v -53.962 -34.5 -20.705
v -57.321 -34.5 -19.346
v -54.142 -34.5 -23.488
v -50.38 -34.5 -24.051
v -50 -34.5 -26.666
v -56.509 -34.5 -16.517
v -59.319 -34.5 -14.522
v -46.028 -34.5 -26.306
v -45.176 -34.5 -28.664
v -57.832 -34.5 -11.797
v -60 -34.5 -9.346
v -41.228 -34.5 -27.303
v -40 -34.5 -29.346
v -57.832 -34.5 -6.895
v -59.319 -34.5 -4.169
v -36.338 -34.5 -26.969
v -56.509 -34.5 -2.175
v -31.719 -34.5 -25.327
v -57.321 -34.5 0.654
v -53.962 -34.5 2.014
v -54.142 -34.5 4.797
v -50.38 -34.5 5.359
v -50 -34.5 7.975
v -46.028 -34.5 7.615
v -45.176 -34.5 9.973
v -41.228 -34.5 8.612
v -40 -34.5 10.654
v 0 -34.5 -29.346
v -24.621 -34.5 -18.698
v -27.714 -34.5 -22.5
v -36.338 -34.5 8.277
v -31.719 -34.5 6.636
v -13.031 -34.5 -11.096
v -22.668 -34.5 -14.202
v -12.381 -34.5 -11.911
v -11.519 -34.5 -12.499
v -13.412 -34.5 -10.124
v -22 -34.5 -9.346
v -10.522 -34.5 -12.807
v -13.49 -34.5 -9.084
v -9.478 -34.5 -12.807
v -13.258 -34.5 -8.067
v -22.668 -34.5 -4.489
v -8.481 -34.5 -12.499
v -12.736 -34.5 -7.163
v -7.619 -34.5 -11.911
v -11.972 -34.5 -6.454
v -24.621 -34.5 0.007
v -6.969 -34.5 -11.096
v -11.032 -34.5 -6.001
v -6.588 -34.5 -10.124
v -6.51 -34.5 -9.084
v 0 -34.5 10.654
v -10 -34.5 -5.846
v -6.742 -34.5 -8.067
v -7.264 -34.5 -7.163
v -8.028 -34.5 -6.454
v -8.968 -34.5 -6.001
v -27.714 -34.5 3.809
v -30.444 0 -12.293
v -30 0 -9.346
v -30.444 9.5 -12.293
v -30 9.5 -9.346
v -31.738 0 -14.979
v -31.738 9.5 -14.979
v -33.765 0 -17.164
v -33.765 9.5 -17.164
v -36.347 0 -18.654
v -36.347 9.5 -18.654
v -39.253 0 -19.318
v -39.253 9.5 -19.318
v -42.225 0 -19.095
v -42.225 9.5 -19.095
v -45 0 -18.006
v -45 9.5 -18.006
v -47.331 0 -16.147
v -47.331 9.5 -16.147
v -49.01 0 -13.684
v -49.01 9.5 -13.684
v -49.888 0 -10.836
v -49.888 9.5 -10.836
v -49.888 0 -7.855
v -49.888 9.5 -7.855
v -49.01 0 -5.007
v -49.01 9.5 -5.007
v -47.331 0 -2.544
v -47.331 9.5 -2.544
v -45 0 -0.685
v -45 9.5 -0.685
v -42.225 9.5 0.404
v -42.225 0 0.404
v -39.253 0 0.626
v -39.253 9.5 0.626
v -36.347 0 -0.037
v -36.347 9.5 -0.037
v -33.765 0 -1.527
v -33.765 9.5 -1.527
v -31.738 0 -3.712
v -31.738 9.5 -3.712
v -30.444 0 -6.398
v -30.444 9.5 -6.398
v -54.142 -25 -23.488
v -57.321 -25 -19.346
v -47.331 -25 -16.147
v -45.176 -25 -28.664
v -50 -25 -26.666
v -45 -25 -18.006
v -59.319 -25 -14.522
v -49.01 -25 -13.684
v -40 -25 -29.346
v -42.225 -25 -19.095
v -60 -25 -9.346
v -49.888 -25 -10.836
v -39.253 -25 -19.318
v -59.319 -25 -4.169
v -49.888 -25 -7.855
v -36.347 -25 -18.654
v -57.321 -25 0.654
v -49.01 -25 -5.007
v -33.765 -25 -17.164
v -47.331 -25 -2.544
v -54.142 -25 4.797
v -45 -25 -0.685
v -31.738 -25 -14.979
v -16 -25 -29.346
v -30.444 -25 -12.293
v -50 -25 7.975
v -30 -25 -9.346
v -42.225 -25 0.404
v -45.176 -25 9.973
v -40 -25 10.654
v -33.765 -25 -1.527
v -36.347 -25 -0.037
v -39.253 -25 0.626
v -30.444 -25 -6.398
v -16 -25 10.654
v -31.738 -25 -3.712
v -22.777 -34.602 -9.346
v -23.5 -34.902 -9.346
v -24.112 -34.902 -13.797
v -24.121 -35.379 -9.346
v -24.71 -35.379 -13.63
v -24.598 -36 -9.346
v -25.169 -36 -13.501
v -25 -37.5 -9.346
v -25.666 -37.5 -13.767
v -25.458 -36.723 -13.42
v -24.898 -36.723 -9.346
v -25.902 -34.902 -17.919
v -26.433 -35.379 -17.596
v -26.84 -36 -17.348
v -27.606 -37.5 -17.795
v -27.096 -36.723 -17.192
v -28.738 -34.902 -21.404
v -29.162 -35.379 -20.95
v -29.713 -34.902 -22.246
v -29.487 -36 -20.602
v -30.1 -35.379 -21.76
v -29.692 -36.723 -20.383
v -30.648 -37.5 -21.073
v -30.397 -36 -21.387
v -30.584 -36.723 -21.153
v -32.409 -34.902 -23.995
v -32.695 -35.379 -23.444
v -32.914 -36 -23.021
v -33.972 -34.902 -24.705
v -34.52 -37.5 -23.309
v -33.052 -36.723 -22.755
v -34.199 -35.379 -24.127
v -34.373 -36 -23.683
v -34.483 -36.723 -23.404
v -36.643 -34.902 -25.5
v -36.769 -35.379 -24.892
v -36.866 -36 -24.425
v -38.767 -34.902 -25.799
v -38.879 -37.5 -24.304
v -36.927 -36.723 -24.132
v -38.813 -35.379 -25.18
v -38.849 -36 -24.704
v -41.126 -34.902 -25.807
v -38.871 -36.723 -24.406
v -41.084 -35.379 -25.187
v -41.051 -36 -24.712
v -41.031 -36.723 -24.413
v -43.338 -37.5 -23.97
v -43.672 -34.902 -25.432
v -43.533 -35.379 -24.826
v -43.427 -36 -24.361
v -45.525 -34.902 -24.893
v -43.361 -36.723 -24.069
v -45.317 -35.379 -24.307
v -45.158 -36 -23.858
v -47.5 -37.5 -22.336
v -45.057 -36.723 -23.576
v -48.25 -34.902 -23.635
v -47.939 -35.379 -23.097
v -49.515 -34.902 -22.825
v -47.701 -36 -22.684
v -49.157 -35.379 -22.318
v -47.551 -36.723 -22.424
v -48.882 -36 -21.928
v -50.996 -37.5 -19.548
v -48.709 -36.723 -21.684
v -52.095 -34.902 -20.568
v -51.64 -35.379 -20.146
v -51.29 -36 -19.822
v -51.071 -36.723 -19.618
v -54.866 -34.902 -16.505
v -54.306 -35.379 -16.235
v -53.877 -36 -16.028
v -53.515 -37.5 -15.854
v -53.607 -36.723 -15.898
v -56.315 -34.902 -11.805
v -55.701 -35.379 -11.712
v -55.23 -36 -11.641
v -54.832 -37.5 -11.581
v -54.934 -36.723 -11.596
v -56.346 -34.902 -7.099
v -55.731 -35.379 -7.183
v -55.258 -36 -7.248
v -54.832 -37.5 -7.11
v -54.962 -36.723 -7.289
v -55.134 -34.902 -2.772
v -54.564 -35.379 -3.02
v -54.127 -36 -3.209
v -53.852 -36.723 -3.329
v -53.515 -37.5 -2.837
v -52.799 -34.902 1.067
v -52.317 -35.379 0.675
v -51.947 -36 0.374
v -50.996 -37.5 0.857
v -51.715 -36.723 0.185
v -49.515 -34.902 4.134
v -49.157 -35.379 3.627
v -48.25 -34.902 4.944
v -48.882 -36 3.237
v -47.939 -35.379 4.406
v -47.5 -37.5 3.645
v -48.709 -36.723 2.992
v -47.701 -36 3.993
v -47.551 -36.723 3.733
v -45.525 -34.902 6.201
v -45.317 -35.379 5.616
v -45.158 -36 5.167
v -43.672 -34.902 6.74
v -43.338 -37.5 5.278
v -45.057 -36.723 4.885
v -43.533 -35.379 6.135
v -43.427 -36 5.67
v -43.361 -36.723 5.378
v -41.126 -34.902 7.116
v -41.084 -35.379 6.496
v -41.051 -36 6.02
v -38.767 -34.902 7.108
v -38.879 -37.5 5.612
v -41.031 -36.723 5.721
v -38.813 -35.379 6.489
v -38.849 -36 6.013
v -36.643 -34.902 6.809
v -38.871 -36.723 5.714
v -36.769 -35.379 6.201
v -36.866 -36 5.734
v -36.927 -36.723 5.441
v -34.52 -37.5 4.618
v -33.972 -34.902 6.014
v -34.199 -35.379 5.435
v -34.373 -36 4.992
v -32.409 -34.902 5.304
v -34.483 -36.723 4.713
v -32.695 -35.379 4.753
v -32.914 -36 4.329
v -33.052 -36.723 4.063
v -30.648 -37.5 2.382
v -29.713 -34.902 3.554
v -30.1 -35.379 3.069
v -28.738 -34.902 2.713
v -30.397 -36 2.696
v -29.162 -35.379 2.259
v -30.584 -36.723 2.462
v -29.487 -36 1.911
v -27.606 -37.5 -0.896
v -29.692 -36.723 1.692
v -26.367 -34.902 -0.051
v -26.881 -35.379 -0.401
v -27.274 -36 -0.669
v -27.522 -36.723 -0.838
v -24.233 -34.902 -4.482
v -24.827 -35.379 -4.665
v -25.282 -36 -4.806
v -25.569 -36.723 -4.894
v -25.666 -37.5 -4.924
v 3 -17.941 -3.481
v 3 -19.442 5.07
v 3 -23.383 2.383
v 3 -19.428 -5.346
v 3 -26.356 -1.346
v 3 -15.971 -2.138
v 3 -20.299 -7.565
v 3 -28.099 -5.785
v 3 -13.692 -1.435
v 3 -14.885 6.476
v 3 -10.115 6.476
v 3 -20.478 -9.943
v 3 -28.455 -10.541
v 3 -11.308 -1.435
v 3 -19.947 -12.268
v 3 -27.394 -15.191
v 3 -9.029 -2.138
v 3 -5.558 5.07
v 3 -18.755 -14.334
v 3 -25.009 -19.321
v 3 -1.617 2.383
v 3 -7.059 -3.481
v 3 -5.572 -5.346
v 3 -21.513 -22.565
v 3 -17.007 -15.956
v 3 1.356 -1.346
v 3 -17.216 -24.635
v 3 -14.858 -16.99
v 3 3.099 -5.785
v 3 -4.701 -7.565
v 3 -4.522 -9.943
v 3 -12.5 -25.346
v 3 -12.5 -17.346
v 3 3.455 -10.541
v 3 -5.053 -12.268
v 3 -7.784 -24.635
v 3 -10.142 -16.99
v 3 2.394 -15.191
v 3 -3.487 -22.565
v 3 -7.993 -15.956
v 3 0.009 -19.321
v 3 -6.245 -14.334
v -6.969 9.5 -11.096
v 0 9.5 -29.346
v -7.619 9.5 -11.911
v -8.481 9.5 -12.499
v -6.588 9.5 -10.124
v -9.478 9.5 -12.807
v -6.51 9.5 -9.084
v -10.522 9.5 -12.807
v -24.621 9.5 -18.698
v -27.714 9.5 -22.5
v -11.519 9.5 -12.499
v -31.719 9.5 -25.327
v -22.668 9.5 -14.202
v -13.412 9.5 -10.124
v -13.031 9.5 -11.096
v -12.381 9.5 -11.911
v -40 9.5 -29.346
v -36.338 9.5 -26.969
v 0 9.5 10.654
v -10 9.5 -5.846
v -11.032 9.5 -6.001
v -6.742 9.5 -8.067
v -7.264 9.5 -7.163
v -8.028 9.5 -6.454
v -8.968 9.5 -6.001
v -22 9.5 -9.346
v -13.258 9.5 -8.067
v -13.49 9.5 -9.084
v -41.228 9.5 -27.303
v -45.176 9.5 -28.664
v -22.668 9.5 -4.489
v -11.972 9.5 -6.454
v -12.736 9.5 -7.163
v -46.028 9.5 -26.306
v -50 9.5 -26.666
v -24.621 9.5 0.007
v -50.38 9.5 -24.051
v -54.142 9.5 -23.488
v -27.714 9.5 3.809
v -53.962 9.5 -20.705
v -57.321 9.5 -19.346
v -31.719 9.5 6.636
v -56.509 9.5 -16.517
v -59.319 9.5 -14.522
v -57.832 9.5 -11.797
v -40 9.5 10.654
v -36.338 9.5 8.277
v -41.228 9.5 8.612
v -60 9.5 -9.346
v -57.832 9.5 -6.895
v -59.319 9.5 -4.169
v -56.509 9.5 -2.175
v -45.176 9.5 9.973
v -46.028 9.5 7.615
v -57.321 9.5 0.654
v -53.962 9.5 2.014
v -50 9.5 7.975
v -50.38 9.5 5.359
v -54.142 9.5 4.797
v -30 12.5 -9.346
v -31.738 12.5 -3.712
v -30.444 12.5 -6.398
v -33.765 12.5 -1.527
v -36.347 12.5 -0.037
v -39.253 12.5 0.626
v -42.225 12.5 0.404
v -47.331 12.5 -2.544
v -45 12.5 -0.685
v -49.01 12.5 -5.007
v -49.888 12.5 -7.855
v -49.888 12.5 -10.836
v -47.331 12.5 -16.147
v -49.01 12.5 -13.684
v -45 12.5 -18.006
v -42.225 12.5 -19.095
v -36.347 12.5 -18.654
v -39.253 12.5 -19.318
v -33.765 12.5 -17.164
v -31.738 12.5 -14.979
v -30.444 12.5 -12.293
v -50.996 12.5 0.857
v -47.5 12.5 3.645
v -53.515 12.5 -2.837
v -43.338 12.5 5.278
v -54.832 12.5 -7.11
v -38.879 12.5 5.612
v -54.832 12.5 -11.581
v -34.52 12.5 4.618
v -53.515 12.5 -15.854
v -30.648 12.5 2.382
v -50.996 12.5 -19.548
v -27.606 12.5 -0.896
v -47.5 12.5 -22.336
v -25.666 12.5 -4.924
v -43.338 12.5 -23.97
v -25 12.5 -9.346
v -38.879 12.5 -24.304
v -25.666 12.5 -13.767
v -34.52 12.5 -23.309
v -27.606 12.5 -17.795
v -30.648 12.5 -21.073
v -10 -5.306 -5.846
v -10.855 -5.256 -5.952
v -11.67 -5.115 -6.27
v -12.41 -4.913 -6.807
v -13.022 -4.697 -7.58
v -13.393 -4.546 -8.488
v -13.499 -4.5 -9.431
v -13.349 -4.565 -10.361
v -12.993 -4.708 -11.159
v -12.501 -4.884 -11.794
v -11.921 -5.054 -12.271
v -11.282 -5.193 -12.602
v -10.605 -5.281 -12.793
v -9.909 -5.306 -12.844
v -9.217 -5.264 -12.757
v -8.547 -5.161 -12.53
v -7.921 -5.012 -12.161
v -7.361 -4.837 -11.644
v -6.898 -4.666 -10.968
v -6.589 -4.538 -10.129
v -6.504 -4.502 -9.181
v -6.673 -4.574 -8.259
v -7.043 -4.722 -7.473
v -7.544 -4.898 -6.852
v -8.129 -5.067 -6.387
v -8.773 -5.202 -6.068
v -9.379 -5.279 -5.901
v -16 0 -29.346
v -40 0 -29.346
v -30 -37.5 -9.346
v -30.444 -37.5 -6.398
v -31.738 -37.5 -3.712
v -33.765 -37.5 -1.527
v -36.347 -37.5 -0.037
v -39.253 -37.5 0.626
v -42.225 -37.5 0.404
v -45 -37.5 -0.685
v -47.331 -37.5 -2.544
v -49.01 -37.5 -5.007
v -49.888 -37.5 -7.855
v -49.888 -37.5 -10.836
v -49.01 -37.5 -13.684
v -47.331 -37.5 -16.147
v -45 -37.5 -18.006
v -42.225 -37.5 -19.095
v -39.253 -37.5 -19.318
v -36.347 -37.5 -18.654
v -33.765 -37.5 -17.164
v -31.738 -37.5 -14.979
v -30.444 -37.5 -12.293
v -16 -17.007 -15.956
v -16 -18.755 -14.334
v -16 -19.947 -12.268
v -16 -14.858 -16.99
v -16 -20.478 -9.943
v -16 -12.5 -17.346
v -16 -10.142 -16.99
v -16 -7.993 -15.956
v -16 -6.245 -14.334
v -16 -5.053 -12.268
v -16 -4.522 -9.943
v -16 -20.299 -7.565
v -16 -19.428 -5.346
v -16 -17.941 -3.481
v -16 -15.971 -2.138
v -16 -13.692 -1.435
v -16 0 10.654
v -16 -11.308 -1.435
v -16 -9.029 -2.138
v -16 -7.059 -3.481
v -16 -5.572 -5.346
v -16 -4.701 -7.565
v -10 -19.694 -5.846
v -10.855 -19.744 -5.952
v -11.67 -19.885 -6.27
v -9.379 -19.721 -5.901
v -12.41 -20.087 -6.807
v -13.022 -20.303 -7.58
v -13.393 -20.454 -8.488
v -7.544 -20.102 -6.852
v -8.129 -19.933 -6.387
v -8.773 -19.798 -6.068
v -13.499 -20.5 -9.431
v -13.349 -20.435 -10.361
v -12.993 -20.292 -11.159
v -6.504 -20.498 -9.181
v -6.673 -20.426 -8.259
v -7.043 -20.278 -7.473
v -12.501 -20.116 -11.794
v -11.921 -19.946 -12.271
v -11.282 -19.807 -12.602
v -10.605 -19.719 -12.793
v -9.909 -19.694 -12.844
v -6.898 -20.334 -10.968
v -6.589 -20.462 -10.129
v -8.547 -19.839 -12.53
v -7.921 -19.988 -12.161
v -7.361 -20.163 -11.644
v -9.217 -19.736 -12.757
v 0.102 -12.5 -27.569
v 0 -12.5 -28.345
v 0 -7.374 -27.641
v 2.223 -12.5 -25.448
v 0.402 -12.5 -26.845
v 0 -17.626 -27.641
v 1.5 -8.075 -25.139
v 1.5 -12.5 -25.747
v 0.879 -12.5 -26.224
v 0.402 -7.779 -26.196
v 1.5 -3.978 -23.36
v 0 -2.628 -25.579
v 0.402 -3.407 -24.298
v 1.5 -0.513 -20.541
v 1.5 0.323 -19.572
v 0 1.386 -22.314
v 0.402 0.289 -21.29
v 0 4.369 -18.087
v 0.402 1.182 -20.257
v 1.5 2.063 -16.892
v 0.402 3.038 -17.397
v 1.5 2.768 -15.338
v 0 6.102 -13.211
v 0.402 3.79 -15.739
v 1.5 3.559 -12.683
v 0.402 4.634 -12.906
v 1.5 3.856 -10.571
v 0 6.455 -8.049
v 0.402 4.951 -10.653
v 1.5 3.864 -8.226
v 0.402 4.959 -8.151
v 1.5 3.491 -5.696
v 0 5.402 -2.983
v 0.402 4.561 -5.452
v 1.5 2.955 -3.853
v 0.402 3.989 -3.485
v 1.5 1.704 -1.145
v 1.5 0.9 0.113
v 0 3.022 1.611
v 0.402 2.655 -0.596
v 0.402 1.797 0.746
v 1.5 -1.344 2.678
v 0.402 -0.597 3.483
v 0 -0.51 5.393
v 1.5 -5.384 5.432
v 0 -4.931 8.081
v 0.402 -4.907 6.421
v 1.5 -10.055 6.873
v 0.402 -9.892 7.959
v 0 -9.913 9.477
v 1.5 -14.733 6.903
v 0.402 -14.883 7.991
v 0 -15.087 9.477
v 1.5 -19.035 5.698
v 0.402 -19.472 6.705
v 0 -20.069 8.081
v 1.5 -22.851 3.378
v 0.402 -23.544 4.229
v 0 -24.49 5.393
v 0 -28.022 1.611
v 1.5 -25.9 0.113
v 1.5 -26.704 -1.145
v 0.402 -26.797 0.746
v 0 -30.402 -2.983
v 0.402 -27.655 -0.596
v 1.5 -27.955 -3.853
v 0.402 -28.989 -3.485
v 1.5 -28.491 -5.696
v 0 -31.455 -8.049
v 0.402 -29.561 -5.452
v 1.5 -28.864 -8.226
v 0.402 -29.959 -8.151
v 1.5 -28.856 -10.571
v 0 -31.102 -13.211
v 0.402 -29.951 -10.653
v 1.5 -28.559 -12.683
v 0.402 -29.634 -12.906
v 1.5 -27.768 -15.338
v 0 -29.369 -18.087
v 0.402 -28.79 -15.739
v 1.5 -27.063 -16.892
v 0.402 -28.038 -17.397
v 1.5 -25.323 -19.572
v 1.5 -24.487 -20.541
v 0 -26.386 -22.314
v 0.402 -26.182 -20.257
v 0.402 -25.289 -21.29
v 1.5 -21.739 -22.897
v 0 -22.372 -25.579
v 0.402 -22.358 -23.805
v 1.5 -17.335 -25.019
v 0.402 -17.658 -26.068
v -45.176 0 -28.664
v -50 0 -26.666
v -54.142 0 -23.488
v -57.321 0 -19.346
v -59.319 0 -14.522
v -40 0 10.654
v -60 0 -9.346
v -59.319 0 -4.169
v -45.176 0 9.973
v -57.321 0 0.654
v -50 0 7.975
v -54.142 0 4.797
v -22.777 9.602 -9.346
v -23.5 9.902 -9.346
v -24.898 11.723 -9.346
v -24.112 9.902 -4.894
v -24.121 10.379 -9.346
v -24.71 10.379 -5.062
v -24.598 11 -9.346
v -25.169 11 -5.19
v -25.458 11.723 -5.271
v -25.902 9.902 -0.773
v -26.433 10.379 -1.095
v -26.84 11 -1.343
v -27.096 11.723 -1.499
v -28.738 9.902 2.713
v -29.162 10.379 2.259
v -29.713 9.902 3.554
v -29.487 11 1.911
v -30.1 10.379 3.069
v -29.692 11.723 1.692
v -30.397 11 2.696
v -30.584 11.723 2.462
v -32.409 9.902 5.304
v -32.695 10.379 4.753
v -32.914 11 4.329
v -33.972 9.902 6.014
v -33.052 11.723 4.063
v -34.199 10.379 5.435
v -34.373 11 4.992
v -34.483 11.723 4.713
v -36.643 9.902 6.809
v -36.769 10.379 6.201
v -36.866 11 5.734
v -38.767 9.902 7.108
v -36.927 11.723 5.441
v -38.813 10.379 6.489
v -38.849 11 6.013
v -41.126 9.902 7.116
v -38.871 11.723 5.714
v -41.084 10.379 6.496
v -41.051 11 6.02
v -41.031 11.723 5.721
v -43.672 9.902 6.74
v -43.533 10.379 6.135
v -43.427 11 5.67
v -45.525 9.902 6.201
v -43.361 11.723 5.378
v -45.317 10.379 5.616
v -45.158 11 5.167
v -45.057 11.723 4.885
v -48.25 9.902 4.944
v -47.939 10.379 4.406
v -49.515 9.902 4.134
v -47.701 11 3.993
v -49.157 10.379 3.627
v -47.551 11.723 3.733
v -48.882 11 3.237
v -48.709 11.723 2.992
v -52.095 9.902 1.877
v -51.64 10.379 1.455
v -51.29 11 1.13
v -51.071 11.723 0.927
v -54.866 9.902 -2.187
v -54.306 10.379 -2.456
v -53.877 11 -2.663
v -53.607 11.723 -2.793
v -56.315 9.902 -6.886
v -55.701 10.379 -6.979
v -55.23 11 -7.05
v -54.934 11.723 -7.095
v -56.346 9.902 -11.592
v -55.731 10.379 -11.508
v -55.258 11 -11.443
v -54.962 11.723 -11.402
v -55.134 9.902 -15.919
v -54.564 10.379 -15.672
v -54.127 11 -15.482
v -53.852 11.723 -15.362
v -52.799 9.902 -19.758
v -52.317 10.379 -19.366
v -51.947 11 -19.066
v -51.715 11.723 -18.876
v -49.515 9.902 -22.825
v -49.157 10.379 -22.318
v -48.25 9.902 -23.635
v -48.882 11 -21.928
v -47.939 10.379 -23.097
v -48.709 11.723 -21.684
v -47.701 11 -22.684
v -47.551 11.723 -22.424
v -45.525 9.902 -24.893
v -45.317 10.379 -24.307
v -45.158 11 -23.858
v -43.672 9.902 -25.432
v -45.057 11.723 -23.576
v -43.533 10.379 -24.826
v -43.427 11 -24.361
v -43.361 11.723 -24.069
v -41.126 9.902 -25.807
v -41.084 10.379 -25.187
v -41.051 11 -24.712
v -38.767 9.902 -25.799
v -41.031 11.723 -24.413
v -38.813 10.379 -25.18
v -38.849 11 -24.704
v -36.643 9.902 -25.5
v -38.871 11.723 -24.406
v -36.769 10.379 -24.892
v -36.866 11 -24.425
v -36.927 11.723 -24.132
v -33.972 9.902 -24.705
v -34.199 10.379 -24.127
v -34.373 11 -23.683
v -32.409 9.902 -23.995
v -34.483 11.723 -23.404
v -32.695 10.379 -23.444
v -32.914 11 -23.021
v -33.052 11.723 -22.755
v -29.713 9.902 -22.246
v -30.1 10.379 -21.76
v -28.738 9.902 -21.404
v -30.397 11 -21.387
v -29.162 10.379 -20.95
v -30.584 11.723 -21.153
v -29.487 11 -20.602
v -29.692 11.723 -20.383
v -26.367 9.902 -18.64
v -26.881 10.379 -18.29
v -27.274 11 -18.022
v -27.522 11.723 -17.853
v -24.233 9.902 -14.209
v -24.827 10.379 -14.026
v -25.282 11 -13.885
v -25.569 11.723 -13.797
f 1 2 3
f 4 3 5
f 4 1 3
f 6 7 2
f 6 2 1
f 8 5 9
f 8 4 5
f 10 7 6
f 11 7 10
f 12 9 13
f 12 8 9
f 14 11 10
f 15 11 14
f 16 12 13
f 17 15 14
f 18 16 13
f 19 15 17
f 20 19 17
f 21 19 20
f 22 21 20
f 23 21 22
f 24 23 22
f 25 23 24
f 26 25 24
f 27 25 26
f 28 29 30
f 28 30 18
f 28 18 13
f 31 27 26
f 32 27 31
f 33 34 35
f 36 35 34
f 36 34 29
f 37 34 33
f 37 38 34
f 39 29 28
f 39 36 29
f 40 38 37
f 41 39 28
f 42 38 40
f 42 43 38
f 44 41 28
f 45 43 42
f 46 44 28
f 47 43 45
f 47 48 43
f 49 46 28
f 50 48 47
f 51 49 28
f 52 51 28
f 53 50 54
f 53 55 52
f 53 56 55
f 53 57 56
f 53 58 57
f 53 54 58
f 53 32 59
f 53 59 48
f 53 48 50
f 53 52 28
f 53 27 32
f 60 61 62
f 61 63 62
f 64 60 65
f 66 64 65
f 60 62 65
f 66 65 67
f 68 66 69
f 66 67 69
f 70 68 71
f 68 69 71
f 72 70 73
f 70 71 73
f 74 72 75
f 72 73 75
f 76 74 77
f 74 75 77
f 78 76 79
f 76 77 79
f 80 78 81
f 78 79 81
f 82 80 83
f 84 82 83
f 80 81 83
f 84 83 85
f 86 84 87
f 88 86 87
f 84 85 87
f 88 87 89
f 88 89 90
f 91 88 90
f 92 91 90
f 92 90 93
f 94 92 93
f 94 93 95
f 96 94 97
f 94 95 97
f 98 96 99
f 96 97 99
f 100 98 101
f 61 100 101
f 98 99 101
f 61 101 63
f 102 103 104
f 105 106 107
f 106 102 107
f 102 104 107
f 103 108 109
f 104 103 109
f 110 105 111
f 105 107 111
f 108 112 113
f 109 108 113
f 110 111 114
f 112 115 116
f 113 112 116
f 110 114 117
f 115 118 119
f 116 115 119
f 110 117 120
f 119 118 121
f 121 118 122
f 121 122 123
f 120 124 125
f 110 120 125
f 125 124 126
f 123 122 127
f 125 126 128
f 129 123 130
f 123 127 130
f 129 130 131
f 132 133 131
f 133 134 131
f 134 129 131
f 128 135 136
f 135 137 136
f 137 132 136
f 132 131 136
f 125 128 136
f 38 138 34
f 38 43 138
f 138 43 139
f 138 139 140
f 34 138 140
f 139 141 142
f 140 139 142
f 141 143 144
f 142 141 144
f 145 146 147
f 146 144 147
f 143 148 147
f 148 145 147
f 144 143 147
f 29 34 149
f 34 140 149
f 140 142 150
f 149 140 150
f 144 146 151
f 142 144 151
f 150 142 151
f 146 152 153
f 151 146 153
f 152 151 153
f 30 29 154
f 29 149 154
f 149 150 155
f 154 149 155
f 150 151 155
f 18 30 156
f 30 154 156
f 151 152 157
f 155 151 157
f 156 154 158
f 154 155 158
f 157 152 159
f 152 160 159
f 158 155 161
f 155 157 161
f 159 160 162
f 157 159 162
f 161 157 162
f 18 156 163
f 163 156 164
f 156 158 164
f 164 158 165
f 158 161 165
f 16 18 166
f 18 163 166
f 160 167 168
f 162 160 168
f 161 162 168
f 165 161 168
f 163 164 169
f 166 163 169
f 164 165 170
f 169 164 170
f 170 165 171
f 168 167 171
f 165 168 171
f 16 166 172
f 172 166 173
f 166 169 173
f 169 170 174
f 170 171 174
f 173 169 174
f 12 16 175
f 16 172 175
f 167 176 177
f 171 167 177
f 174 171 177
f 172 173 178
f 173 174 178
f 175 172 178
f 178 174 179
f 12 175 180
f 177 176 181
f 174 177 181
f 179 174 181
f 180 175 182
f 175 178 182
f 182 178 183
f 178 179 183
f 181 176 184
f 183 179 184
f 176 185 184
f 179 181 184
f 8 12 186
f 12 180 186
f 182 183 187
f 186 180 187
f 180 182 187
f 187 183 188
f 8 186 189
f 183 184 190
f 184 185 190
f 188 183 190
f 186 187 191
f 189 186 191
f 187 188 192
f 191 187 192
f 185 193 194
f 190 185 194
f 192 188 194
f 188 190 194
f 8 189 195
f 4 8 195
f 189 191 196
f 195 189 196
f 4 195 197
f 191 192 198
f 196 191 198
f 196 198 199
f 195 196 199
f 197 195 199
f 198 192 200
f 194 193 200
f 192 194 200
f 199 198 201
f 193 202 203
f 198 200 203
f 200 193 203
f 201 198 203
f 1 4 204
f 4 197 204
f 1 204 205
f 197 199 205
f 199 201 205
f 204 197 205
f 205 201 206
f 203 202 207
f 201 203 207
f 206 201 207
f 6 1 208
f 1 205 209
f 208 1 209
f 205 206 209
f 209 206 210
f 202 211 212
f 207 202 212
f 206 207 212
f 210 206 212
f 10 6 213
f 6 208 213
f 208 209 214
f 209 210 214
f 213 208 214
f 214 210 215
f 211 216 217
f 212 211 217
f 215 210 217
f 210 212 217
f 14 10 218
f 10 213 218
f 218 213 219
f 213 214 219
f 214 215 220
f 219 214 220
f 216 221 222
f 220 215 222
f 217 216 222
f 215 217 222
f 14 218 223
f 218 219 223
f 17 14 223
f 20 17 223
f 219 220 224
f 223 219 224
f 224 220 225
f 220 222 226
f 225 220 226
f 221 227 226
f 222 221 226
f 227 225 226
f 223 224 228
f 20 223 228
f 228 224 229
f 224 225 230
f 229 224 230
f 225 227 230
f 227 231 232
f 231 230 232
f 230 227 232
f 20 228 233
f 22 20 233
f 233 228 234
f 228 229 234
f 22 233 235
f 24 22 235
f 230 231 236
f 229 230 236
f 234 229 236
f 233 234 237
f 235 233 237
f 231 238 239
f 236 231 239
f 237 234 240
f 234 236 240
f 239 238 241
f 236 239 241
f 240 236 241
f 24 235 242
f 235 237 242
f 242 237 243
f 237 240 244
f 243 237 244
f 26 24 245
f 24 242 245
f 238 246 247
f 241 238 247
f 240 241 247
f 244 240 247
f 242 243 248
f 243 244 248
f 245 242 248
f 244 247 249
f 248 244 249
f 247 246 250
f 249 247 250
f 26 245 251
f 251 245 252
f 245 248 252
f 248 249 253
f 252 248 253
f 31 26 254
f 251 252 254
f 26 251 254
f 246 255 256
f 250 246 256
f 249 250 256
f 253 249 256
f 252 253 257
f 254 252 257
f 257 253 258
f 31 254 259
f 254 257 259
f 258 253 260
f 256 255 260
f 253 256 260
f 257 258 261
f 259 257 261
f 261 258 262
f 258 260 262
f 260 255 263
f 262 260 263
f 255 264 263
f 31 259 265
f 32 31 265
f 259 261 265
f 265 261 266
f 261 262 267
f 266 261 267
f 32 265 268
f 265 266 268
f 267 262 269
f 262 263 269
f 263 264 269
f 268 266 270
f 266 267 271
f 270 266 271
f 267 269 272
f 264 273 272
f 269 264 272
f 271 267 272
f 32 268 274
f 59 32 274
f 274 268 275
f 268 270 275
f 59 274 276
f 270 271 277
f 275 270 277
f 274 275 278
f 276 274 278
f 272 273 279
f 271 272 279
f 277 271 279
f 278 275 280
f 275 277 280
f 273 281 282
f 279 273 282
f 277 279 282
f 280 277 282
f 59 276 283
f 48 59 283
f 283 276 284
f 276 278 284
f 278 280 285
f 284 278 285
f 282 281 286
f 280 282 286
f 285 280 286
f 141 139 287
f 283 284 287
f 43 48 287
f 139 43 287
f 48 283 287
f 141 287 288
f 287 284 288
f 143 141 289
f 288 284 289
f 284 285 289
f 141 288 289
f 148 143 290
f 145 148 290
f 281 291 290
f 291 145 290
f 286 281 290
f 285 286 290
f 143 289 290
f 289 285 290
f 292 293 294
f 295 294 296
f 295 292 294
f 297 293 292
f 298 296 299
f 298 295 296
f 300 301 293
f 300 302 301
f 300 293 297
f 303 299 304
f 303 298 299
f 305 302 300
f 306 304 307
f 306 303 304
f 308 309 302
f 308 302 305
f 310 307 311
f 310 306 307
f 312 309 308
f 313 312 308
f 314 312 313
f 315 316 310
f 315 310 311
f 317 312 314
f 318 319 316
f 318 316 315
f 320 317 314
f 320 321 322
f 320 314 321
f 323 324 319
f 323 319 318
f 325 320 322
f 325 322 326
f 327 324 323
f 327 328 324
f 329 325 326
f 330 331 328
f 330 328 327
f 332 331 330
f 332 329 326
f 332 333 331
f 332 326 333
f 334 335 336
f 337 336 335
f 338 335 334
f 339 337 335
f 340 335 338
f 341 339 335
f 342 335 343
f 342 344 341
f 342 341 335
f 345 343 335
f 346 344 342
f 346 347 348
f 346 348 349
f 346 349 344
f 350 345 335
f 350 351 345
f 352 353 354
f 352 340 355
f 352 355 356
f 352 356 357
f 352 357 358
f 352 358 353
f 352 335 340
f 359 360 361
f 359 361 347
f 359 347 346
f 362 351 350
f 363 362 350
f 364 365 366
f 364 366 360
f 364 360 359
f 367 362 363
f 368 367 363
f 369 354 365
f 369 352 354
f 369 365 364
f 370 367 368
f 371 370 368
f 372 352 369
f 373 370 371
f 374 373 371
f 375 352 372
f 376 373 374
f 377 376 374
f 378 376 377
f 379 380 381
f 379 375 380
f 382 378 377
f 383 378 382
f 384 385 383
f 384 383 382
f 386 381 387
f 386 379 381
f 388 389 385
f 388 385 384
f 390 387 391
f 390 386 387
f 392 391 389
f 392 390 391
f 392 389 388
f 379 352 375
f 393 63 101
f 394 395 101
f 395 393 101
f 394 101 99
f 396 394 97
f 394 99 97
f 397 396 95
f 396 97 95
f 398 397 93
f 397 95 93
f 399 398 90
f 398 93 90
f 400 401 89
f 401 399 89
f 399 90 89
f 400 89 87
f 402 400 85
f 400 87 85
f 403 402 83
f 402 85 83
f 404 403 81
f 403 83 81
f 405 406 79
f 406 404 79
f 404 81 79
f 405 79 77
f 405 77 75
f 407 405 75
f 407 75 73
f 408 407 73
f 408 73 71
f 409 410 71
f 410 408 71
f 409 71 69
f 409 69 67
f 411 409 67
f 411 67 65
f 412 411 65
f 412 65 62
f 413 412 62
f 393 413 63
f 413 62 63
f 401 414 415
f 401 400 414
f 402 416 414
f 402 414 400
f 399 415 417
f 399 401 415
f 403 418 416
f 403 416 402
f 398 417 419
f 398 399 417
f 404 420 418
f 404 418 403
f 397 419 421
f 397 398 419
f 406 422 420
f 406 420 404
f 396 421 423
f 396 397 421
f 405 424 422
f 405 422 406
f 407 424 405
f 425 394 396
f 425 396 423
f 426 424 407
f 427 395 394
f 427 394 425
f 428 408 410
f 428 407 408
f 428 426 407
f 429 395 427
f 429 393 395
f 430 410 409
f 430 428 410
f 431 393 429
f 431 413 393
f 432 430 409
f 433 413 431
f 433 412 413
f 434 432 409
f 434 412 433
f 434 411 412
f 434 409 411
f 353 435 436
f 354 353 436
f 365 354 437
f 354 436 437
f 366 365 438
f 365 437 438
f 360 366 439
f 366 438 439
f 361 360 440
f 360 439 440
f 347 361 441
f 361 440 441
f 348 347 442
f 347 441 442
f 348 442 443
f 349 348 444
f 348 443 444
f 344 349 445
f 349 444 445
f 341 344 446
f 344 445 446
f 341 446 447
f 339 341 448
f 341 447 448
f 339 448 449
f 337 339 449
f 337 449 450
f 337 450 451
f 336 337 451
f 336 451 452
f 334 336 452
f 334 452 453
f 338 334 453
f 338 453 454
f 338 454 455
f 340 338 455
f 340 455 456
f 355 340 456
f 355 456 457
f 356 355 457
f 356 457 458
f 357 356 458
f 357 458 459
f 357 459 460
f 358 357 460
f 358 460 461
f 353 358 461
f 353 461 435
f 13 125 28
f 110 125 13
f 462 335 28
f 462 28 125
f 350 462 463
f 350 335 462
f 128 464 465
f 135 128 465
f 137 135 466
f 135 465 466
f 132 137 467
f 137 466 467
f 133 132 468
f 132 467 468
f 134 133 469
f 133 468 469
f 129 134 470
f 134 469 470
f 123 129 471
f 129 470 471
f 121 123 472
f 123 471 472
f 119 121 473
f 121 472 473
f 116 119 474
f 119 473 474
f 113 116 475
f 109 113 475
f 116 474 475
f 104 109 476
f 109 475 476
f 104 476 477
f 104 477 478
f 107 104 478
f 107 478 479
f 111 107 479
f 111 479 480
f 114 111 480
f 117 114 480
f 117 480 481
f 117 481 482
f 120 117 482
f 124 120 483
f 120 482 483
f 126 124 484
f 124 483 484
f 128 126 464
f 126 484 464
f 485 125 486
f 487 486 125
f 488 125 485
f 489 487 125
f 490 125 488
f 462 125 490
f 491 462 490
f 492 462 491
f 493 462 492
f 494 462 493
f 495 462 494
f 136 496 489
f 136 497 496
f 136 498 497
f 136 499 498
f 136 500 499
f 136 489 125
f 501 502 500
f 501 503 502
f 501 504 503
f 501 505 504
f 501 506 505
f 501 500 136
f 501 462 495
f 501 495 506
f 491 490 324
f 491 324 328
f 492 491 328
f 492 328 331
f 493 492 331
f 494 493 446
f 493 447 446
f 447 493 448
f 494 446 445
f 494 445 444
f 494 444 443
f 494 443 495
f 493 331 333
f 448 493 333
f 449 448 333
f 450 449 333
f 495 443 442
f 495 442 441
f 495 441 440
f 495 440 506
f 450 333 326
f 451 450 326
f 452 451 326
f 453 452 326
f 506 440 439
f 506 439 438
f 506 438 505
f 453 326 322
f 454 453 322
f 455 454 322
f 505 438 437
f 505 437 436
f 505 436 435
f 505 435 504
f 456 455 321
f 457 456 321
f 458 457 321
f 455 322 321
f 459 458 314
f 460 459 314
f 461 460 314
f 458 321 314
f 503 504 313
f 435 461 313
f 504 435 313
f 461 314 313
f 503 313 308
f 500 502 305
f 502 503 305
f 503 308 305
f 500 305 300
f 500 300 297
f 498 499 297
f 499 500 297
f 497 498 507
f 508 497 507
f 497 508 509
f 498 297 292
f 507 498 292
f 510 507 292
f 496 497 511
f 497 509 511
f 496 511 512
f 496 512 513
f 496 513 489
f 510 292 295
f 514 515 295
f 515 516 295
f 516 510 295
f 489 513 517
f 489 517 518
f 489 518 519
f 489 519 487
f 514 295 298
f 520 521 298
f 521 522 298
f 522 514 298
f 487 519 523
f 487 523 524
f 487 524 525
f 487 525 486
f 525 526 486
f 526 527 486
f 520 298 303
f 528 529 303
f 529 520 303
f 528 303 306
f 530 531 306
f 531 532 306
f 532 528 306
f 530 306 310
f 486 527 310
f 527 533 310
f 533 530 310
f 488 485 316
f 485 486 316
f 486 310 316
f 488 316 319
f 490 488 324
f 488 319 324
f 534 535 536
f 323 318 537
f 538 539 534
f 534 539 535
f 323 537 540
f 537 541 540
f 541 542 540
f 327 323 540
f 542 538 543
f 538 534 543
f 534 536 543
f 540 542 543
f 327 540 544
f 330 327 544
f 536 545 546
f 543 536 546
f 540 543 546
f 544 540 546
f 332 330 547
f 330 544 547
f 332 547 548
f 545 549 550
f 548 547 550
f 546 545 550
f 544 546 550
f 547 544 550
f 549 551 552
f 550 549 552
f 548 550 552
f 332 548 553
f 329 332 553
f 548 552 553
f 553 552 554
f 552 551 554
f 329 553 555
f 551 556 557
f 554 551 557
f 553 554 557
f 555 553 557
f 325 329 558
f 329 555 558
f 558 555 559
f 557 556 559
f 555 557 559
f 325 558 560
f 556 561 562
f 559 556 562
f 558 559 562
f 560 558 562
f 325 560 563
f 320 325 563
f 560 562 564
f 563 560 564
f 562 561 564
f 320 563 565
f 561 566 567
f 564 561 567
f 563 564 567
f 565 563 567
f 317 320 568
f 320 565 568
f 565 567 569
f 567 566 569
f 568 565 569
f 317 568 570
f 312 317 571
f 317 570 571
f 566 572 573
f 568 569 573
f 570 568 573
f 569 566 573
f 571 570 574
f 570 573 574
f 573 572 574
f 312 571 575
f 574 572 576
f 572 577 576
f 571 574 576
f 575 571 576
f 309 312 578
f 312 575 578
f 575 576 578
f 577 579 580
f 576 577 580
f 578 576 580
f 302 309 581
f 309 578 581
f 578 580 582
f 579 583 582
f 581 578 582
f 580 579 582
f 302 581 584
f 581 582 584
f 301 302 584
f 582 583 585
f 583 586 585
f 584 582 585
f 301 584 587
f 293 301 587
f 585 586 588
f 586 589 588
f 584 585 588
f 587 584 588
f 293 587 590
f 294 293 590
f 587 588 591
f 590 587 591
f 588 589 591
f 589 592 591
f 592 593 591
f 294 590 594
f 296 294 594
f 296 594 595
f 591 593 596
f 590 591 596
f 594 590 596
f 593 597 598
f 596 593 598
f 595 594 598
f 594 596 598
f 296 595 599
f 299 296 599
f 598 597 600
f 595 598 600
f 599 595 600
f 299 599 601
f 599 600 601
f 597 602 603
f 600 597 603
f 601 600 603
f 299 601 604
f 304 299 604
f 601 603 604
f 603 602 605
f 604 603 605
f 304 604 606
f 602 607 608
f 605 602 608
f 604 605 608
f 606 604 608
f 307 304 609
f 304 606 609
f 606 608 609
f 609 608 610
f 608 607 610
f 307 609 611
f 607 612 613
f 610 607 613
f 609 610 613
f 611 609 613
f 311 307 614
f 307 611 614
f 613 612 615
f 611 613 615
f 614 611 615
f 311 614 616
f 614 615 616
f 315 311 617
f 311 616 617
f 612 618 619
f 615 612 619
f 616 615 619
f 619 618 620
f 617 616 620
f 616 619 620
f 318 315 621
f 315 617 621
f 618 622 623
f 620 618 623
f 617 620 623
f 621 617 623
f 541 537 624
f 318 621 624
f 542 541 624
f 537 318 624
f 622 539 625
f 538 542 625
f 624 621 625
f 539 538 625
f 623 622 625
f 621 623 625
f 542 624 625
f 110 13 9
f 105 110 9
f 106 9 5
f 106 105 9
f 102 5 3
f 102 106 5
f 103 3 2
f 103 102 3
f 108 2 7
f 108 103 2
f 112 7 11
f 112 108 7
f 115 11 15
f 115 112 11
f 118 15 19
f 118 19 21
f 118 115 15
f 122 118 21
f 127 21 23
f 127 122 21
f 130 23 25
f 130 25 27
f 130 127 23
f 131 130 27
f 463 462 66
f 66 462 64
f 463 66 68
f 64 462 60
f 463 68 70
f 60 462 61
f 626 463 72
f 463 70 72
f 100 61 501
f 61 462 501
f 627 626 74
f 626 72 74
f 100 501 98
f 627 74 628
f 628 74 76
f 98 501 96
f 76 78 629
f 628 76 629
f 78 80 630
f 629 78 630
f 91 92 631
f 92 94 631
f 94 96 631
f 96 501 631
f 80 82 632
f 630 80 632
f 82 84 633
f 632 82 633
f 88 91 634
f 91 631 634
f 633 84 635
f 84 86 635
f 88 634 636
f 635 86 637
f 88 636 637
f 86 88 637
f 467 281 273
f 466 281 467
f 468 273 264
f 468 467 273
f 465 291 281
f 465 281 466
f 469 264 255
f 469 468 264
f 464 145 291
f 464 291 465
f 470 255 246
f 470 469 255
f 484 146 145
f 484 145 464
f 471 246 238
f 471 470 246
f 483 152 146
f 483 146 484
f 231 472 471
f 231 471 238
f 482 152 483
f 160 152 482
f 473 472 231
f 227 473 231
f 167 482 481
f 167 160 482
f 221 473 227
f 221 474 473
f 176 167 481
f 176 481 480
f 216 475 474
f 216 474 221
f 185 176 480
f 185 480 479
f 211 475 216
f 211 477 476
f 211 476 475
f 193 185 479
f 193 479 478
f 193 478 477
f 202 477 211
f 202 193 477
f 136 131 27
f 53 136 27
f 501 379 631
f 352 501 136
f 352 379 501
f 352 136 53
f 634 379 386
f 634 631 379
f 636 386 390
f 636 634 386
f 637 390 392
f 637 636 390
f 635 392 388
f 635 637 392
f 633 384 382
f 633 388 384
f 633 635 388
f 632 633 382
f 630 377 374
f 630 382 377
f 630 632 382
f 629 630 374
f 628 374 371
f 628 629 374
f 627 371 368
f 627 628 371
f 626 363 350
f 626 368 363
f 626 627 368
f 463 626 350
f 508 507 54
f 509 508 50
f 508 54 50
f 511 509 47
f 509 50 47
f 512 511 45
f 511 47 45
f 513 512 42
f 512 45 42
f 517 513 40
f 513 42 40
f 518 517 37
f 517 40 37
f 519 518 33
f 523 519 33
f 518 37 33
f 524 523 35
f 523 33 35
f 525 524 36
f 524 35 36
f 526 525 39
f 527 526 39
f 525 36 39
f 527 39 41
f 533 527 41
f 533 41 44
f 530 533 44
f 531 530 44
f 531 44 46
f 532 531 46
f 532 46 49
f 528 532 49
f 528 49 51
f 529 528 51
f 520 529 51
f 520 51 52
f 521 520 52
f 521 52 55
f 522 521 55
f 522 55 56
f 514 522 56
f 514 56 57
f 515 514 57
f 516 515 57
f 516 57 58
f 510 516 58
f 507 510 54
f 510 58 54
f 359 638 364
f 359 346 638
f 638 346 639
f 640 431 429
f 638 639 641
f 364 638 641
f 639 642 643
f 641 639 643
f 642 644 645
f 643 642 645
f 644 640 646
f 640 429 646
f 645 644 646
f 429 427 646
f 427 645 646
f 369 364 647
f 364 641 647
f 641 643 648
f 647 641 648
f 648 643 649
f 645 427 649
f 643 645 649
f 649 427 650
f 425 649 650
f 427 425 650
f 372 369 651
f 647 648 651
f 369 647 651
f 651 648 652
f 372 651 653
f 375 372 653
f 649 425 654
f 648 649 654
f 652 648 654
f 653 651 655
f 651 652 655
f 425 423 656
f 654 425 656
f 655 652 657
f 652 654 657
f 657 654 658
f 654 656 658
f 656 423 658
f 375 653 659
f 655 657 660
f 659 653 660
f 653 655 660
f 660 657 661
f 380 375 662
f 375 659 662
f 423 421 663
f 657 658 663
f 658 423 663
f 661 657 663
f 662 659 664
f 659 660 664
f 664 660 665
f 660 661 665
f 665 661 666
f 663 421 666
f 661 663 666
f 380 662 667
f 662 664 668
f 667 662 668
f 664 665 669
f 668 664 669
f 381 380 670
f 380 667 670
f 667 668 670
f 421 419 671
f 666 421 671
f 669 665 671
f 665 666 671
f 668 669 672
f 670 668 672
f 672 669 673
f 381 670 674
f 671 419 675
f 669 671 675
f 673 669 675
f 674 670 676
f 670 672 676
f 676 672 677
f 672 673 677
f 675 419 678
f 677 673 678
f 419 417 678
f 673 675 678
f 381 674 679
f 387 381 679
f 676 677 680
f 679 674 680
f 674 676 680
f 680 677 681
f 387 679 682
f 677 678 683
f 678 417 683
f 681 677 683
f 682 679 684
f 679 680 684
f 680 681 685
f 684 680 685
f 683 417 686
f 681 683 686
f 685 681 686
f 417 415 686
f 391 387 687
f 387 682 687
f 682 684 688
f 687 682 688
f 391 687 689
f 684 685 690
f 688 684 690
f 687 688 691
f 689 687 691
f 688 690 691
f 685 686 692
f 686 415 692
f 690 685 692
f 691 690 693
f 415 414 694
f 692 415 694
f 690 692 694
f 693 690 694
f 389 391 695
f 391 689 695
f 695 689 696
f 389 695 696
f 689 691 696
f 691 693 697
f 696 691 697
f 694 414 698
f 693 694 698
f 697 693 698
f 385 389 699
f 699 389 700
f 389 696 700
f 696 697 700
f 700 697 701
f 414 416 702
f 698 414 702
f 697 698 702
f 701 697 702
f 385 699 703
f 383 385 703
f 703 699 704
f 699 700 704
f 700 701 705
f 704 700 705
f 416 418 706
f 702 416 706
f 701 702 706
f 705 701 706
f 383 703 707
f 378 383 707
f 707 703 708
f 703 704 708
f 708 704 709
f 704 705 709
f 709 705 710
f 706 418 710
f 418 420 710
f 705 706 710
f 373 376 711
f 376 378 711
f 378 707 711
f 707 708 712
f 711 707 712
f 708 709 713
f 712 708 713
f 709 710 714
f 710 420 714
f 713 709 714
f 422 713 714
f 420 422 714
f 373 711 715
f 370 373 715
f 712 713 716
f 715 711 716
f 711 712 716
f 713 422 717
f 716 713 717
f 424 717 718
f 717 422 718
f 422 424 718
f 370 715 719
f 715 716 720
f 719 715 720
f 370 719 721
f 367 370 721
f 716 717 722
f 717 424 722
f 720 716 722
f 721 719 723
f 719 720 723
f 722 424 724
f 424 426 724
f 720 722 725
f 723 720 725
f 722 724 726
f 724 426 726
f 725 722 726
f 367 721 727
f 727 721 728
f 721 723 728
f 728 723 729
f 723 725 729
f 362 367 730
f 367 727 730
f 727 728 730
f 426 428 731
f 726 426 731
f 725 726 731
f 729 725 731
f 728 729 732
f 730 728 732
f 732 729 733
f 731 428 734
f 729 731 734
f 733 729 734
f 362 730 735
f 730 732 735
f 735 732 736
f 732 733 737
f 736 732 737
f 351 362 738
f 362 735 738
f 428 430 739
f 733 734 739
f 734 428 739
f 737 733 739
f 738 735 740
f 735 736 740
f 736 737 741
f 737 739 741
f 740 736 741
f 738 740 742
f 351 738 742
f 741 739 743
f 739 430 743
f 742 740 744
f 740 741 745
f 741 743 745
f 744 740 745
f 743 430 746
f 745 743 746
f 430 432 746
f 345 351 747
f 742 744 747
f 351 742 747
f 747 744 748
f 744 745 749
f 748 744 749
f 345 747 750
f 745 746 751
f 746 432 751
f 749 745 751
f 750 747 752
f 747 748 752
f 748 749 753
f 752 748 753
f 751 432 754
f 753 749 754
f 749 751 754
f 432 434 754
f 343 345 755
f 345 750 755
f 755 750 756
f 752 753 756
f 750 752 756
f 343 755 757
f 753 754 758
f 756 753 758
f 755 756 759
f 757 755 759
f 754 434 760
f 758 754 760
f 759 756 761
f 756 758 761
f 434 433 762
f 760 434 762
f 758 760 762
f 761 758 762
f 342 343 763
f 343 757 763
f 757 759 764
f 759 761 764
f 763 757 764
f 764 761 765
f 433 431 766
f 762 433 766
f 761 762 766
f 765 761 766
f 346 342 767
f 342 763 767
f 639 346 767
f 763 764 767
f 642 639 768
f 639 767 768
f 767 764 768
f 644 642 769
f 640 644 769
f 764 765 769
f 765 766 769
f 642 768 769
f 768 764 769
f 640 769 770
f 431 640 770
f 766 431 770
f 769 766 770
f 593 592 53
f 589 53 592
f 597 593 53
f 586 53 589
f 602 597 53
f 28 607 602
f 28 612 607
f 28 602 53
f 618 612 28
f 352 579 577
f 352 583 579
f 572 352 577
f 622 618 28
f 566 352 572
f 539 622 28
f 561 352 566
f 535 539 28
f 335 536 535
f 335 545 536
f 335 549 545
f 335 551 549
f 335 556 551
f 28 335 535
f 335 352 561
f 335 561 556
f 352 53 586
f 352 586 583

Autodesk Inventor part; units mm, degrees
ref_plane "YZ Plane" through (0, 0, 0) normal (1, 0, 0) x (0, 1, 0)
ref_plane "XZ Plane" through (0, 0, 0) normal (0, 1, 0) x (-1, 0, 0)
ref_plane "XY Plane" through (0, 0, 0) normal (0, 0, 1) x (1, 0, 0)
sketch "Szkic1" plane through (0, 0, 0) normal (0, 1, 0) x (-1, 0, 0)
  line L0 (0, 10.6544) -> (0, -29.3456)
  line L1 (0, -29.3456) -> (40, -29.3456)
  line L2 (0, 10.6544) -> (40, 10.6544)
  arc A0 (40, -29.3456) -> (40, 10.6544) centre (40, -9.3456) ccw
  point P0 (0, 0)
  dimension "d0" = 40
  dimension "d1" = 40
extrude "Wyciągnięcie proste1" add sketch "Szkic1" along normal blind 9.5
sketch "Szkic2" plane through (0, 9.5, 0) normal (0, 1, 0) x (1, 0, 0)
  line L0 (-40, -10.6544) -> (0, -10.6544) projected
  line L1 (0.0007, -10.6544) -> (-40, -10.6544)
  arc A0 (-40, 29.3456) -> (-40, -10.6544) centre (-40, 9.3456) ccw projected
  circle A1 centre (-40, 9.3456) radius 15
  circle A2 centre (-40, 9.3456) radius 10
  point P0 (0, 0)
  dimension "d4" = 30
  dimension "d5" = 20
extrude "Wyciągnięcie proste2" add sketch "Szkic2" along normal blind 3
fillet "Zaokrąglenie1" radius 3 1 edges at (-55, 9.5, -9.3456)
sketch "Szkic3" plane through (0, 0, 0) normal (0, -1, 0) x (1, 0, 0)
  line L0 (0, 10.6544) -> (0, -29.3456) projected
  line L1 (0, -29.3456) -> (-16, -29.3456)
  line L2 (0, -29.3456) -> (-40, -29.3456) projected
  line L3 (-16, -29.3456) -> (-16, 10.6544)
  line L4 (-40, 10.6544) -> (0, 10.6544) projected
  line L5 (-16, 10.6544) -> (0, 10.6544)
  line L6 (0, 10.6544) -> (0, -29.3456)
  point P0 (0, 0)
  dimension "d9" = 16
  dimension "d10" = 40
extrude "Wyciągnięcie proste3" add sketch "Szkic3" along normal blind 12.5
sketch "Szkic4" plane through (-40, 9.5, -9.3456) normal (0, 1, 0) x (1, 0, 0)
  point P0 (40, -9.3456)
mirror "Odbij1" about plane through (-8, -12.5, -9.3456) normal (0, -1, 0)
sketch "Szkic7" plane through (0, 9.5, 10.6544) normal (1, 0, 0) x (0, 0, -1)
  point P0 (10.6544, -9.5)
sketch "Szkic8" plane through (0, 9.5, 10.6544) normal (1, 0, 0) x (0, 0, -1)
  point P0 (10.6544, -9.5)
sketch "Szkic9" plane through (0, 9.5, 10.6544) normal (1, 0, 0) x (0, 0, -1)
  line L0 (40, 0) -> (0, 0) projected
  line L1 (0, 0) -> (0, -22)
  line L2 (0, -44) -> (0, 0) projected
  line L3 (0, -22) -> (20, -22)
  circle A0 centre (20, -22) radius 16
  circle A1 centre (20, -22) radius 8
  point P0 (10.6544, -9.5)
  dimension "d15" = 22
  dimension "d16" = 32
  dimension "d17" = 16
extrude "Wyciągnięcie proste4" cut sketch "Szkic9" against normal blind 20 contours A1
sketch "Szkic10" plane through (0, 9.5, 10.6544) normal (1, 0, 0) x (0, 0, -1)
  line L0 (0, -9.5) -> (0, 0) projected
  line L1 (0, 0) -> (0, -22)
  line L2 (0, -22) -> (20, -22)
  circle A0 centre (20, -22) radius 16
  point P0 (10.6544, -9.5)
  dimension "d20" = 22
  dimension "d21" = 20
  dimension "d22" = 32
extrude "Wyciągnięcie proste5" add sketch "Szkic10" along normal blind 3
fillet "Zaokrąglenie2" radius 3 1 edges at (0, -12.5, 6.6544)
sketch "Szkic11" plane through (3, -12.5, -9.3456) normal (1, 0, 0) x (0, 0, -1)
  circle A0 centre (0, 0) radius 8
  point P0 (-9.3456, 12.5)
  dimension "d26" = 16
extrude "Wyciągnięcie proste6" cut sketch "Szkic11" against normal blind 20
sketch "Szkic12" plane through (0, 0, 0) normal (0, -1, 0) x (1, 0, 0)
  point P0 (0, 0)
sketch "Szkic13" plane through (-40, -34.5, -9.3456) normal (0, -1, 0) x (1, 0, 0)
  point P0 (40, 9.3456)
sketch "Szkic14" plane through (-40, 12.5, -9.3456) normal (0, 1, 0) x (1, 0, 0)
  point P0 (40, -9.3456)
sketch "Szkic15" plane through (-40, 9.5, -9.3456) normal (0, 1, 0) x (1, 0, 0)
  circle A0 centre (0, 0) radius 10
  point P0 (40, -9.3456)
  dimension "d29" = 20
extrude "Wyciągnięcie proste7" cut sketch "Szkic15" against normal blind 9.5
sketch "Szkic16" plane through (-40, -34.5, -9.3456) normal (0, -1, 0) x (1, 0, 0)
  circle A0 centre (0, 0) radius 10
  point P0 (40, 9.3456)
  dimension "d32" = 20
extrude "Wyciągnięcie proste8" cut sketch "Szkic16" against normal blind 9.5
sketch "Szkic17" plane through (0, 9.5, 0) normal (0, 1, 0) x (1, 0, 0)
  line L0 (0, -10.6544) -> (0, 29.3456) projected
  line L1 (0, 9.3456) -> (-10, 9.3456)
  point P0 (0, 0)
hole "Otwór1" at (-10, 9.5, -9.3456) direction (0, -1, 0) diameter 7 depth 75.75 tip angle 118
properties part number "nakrętka" material "Stal nierdzewna, austenityczna"
